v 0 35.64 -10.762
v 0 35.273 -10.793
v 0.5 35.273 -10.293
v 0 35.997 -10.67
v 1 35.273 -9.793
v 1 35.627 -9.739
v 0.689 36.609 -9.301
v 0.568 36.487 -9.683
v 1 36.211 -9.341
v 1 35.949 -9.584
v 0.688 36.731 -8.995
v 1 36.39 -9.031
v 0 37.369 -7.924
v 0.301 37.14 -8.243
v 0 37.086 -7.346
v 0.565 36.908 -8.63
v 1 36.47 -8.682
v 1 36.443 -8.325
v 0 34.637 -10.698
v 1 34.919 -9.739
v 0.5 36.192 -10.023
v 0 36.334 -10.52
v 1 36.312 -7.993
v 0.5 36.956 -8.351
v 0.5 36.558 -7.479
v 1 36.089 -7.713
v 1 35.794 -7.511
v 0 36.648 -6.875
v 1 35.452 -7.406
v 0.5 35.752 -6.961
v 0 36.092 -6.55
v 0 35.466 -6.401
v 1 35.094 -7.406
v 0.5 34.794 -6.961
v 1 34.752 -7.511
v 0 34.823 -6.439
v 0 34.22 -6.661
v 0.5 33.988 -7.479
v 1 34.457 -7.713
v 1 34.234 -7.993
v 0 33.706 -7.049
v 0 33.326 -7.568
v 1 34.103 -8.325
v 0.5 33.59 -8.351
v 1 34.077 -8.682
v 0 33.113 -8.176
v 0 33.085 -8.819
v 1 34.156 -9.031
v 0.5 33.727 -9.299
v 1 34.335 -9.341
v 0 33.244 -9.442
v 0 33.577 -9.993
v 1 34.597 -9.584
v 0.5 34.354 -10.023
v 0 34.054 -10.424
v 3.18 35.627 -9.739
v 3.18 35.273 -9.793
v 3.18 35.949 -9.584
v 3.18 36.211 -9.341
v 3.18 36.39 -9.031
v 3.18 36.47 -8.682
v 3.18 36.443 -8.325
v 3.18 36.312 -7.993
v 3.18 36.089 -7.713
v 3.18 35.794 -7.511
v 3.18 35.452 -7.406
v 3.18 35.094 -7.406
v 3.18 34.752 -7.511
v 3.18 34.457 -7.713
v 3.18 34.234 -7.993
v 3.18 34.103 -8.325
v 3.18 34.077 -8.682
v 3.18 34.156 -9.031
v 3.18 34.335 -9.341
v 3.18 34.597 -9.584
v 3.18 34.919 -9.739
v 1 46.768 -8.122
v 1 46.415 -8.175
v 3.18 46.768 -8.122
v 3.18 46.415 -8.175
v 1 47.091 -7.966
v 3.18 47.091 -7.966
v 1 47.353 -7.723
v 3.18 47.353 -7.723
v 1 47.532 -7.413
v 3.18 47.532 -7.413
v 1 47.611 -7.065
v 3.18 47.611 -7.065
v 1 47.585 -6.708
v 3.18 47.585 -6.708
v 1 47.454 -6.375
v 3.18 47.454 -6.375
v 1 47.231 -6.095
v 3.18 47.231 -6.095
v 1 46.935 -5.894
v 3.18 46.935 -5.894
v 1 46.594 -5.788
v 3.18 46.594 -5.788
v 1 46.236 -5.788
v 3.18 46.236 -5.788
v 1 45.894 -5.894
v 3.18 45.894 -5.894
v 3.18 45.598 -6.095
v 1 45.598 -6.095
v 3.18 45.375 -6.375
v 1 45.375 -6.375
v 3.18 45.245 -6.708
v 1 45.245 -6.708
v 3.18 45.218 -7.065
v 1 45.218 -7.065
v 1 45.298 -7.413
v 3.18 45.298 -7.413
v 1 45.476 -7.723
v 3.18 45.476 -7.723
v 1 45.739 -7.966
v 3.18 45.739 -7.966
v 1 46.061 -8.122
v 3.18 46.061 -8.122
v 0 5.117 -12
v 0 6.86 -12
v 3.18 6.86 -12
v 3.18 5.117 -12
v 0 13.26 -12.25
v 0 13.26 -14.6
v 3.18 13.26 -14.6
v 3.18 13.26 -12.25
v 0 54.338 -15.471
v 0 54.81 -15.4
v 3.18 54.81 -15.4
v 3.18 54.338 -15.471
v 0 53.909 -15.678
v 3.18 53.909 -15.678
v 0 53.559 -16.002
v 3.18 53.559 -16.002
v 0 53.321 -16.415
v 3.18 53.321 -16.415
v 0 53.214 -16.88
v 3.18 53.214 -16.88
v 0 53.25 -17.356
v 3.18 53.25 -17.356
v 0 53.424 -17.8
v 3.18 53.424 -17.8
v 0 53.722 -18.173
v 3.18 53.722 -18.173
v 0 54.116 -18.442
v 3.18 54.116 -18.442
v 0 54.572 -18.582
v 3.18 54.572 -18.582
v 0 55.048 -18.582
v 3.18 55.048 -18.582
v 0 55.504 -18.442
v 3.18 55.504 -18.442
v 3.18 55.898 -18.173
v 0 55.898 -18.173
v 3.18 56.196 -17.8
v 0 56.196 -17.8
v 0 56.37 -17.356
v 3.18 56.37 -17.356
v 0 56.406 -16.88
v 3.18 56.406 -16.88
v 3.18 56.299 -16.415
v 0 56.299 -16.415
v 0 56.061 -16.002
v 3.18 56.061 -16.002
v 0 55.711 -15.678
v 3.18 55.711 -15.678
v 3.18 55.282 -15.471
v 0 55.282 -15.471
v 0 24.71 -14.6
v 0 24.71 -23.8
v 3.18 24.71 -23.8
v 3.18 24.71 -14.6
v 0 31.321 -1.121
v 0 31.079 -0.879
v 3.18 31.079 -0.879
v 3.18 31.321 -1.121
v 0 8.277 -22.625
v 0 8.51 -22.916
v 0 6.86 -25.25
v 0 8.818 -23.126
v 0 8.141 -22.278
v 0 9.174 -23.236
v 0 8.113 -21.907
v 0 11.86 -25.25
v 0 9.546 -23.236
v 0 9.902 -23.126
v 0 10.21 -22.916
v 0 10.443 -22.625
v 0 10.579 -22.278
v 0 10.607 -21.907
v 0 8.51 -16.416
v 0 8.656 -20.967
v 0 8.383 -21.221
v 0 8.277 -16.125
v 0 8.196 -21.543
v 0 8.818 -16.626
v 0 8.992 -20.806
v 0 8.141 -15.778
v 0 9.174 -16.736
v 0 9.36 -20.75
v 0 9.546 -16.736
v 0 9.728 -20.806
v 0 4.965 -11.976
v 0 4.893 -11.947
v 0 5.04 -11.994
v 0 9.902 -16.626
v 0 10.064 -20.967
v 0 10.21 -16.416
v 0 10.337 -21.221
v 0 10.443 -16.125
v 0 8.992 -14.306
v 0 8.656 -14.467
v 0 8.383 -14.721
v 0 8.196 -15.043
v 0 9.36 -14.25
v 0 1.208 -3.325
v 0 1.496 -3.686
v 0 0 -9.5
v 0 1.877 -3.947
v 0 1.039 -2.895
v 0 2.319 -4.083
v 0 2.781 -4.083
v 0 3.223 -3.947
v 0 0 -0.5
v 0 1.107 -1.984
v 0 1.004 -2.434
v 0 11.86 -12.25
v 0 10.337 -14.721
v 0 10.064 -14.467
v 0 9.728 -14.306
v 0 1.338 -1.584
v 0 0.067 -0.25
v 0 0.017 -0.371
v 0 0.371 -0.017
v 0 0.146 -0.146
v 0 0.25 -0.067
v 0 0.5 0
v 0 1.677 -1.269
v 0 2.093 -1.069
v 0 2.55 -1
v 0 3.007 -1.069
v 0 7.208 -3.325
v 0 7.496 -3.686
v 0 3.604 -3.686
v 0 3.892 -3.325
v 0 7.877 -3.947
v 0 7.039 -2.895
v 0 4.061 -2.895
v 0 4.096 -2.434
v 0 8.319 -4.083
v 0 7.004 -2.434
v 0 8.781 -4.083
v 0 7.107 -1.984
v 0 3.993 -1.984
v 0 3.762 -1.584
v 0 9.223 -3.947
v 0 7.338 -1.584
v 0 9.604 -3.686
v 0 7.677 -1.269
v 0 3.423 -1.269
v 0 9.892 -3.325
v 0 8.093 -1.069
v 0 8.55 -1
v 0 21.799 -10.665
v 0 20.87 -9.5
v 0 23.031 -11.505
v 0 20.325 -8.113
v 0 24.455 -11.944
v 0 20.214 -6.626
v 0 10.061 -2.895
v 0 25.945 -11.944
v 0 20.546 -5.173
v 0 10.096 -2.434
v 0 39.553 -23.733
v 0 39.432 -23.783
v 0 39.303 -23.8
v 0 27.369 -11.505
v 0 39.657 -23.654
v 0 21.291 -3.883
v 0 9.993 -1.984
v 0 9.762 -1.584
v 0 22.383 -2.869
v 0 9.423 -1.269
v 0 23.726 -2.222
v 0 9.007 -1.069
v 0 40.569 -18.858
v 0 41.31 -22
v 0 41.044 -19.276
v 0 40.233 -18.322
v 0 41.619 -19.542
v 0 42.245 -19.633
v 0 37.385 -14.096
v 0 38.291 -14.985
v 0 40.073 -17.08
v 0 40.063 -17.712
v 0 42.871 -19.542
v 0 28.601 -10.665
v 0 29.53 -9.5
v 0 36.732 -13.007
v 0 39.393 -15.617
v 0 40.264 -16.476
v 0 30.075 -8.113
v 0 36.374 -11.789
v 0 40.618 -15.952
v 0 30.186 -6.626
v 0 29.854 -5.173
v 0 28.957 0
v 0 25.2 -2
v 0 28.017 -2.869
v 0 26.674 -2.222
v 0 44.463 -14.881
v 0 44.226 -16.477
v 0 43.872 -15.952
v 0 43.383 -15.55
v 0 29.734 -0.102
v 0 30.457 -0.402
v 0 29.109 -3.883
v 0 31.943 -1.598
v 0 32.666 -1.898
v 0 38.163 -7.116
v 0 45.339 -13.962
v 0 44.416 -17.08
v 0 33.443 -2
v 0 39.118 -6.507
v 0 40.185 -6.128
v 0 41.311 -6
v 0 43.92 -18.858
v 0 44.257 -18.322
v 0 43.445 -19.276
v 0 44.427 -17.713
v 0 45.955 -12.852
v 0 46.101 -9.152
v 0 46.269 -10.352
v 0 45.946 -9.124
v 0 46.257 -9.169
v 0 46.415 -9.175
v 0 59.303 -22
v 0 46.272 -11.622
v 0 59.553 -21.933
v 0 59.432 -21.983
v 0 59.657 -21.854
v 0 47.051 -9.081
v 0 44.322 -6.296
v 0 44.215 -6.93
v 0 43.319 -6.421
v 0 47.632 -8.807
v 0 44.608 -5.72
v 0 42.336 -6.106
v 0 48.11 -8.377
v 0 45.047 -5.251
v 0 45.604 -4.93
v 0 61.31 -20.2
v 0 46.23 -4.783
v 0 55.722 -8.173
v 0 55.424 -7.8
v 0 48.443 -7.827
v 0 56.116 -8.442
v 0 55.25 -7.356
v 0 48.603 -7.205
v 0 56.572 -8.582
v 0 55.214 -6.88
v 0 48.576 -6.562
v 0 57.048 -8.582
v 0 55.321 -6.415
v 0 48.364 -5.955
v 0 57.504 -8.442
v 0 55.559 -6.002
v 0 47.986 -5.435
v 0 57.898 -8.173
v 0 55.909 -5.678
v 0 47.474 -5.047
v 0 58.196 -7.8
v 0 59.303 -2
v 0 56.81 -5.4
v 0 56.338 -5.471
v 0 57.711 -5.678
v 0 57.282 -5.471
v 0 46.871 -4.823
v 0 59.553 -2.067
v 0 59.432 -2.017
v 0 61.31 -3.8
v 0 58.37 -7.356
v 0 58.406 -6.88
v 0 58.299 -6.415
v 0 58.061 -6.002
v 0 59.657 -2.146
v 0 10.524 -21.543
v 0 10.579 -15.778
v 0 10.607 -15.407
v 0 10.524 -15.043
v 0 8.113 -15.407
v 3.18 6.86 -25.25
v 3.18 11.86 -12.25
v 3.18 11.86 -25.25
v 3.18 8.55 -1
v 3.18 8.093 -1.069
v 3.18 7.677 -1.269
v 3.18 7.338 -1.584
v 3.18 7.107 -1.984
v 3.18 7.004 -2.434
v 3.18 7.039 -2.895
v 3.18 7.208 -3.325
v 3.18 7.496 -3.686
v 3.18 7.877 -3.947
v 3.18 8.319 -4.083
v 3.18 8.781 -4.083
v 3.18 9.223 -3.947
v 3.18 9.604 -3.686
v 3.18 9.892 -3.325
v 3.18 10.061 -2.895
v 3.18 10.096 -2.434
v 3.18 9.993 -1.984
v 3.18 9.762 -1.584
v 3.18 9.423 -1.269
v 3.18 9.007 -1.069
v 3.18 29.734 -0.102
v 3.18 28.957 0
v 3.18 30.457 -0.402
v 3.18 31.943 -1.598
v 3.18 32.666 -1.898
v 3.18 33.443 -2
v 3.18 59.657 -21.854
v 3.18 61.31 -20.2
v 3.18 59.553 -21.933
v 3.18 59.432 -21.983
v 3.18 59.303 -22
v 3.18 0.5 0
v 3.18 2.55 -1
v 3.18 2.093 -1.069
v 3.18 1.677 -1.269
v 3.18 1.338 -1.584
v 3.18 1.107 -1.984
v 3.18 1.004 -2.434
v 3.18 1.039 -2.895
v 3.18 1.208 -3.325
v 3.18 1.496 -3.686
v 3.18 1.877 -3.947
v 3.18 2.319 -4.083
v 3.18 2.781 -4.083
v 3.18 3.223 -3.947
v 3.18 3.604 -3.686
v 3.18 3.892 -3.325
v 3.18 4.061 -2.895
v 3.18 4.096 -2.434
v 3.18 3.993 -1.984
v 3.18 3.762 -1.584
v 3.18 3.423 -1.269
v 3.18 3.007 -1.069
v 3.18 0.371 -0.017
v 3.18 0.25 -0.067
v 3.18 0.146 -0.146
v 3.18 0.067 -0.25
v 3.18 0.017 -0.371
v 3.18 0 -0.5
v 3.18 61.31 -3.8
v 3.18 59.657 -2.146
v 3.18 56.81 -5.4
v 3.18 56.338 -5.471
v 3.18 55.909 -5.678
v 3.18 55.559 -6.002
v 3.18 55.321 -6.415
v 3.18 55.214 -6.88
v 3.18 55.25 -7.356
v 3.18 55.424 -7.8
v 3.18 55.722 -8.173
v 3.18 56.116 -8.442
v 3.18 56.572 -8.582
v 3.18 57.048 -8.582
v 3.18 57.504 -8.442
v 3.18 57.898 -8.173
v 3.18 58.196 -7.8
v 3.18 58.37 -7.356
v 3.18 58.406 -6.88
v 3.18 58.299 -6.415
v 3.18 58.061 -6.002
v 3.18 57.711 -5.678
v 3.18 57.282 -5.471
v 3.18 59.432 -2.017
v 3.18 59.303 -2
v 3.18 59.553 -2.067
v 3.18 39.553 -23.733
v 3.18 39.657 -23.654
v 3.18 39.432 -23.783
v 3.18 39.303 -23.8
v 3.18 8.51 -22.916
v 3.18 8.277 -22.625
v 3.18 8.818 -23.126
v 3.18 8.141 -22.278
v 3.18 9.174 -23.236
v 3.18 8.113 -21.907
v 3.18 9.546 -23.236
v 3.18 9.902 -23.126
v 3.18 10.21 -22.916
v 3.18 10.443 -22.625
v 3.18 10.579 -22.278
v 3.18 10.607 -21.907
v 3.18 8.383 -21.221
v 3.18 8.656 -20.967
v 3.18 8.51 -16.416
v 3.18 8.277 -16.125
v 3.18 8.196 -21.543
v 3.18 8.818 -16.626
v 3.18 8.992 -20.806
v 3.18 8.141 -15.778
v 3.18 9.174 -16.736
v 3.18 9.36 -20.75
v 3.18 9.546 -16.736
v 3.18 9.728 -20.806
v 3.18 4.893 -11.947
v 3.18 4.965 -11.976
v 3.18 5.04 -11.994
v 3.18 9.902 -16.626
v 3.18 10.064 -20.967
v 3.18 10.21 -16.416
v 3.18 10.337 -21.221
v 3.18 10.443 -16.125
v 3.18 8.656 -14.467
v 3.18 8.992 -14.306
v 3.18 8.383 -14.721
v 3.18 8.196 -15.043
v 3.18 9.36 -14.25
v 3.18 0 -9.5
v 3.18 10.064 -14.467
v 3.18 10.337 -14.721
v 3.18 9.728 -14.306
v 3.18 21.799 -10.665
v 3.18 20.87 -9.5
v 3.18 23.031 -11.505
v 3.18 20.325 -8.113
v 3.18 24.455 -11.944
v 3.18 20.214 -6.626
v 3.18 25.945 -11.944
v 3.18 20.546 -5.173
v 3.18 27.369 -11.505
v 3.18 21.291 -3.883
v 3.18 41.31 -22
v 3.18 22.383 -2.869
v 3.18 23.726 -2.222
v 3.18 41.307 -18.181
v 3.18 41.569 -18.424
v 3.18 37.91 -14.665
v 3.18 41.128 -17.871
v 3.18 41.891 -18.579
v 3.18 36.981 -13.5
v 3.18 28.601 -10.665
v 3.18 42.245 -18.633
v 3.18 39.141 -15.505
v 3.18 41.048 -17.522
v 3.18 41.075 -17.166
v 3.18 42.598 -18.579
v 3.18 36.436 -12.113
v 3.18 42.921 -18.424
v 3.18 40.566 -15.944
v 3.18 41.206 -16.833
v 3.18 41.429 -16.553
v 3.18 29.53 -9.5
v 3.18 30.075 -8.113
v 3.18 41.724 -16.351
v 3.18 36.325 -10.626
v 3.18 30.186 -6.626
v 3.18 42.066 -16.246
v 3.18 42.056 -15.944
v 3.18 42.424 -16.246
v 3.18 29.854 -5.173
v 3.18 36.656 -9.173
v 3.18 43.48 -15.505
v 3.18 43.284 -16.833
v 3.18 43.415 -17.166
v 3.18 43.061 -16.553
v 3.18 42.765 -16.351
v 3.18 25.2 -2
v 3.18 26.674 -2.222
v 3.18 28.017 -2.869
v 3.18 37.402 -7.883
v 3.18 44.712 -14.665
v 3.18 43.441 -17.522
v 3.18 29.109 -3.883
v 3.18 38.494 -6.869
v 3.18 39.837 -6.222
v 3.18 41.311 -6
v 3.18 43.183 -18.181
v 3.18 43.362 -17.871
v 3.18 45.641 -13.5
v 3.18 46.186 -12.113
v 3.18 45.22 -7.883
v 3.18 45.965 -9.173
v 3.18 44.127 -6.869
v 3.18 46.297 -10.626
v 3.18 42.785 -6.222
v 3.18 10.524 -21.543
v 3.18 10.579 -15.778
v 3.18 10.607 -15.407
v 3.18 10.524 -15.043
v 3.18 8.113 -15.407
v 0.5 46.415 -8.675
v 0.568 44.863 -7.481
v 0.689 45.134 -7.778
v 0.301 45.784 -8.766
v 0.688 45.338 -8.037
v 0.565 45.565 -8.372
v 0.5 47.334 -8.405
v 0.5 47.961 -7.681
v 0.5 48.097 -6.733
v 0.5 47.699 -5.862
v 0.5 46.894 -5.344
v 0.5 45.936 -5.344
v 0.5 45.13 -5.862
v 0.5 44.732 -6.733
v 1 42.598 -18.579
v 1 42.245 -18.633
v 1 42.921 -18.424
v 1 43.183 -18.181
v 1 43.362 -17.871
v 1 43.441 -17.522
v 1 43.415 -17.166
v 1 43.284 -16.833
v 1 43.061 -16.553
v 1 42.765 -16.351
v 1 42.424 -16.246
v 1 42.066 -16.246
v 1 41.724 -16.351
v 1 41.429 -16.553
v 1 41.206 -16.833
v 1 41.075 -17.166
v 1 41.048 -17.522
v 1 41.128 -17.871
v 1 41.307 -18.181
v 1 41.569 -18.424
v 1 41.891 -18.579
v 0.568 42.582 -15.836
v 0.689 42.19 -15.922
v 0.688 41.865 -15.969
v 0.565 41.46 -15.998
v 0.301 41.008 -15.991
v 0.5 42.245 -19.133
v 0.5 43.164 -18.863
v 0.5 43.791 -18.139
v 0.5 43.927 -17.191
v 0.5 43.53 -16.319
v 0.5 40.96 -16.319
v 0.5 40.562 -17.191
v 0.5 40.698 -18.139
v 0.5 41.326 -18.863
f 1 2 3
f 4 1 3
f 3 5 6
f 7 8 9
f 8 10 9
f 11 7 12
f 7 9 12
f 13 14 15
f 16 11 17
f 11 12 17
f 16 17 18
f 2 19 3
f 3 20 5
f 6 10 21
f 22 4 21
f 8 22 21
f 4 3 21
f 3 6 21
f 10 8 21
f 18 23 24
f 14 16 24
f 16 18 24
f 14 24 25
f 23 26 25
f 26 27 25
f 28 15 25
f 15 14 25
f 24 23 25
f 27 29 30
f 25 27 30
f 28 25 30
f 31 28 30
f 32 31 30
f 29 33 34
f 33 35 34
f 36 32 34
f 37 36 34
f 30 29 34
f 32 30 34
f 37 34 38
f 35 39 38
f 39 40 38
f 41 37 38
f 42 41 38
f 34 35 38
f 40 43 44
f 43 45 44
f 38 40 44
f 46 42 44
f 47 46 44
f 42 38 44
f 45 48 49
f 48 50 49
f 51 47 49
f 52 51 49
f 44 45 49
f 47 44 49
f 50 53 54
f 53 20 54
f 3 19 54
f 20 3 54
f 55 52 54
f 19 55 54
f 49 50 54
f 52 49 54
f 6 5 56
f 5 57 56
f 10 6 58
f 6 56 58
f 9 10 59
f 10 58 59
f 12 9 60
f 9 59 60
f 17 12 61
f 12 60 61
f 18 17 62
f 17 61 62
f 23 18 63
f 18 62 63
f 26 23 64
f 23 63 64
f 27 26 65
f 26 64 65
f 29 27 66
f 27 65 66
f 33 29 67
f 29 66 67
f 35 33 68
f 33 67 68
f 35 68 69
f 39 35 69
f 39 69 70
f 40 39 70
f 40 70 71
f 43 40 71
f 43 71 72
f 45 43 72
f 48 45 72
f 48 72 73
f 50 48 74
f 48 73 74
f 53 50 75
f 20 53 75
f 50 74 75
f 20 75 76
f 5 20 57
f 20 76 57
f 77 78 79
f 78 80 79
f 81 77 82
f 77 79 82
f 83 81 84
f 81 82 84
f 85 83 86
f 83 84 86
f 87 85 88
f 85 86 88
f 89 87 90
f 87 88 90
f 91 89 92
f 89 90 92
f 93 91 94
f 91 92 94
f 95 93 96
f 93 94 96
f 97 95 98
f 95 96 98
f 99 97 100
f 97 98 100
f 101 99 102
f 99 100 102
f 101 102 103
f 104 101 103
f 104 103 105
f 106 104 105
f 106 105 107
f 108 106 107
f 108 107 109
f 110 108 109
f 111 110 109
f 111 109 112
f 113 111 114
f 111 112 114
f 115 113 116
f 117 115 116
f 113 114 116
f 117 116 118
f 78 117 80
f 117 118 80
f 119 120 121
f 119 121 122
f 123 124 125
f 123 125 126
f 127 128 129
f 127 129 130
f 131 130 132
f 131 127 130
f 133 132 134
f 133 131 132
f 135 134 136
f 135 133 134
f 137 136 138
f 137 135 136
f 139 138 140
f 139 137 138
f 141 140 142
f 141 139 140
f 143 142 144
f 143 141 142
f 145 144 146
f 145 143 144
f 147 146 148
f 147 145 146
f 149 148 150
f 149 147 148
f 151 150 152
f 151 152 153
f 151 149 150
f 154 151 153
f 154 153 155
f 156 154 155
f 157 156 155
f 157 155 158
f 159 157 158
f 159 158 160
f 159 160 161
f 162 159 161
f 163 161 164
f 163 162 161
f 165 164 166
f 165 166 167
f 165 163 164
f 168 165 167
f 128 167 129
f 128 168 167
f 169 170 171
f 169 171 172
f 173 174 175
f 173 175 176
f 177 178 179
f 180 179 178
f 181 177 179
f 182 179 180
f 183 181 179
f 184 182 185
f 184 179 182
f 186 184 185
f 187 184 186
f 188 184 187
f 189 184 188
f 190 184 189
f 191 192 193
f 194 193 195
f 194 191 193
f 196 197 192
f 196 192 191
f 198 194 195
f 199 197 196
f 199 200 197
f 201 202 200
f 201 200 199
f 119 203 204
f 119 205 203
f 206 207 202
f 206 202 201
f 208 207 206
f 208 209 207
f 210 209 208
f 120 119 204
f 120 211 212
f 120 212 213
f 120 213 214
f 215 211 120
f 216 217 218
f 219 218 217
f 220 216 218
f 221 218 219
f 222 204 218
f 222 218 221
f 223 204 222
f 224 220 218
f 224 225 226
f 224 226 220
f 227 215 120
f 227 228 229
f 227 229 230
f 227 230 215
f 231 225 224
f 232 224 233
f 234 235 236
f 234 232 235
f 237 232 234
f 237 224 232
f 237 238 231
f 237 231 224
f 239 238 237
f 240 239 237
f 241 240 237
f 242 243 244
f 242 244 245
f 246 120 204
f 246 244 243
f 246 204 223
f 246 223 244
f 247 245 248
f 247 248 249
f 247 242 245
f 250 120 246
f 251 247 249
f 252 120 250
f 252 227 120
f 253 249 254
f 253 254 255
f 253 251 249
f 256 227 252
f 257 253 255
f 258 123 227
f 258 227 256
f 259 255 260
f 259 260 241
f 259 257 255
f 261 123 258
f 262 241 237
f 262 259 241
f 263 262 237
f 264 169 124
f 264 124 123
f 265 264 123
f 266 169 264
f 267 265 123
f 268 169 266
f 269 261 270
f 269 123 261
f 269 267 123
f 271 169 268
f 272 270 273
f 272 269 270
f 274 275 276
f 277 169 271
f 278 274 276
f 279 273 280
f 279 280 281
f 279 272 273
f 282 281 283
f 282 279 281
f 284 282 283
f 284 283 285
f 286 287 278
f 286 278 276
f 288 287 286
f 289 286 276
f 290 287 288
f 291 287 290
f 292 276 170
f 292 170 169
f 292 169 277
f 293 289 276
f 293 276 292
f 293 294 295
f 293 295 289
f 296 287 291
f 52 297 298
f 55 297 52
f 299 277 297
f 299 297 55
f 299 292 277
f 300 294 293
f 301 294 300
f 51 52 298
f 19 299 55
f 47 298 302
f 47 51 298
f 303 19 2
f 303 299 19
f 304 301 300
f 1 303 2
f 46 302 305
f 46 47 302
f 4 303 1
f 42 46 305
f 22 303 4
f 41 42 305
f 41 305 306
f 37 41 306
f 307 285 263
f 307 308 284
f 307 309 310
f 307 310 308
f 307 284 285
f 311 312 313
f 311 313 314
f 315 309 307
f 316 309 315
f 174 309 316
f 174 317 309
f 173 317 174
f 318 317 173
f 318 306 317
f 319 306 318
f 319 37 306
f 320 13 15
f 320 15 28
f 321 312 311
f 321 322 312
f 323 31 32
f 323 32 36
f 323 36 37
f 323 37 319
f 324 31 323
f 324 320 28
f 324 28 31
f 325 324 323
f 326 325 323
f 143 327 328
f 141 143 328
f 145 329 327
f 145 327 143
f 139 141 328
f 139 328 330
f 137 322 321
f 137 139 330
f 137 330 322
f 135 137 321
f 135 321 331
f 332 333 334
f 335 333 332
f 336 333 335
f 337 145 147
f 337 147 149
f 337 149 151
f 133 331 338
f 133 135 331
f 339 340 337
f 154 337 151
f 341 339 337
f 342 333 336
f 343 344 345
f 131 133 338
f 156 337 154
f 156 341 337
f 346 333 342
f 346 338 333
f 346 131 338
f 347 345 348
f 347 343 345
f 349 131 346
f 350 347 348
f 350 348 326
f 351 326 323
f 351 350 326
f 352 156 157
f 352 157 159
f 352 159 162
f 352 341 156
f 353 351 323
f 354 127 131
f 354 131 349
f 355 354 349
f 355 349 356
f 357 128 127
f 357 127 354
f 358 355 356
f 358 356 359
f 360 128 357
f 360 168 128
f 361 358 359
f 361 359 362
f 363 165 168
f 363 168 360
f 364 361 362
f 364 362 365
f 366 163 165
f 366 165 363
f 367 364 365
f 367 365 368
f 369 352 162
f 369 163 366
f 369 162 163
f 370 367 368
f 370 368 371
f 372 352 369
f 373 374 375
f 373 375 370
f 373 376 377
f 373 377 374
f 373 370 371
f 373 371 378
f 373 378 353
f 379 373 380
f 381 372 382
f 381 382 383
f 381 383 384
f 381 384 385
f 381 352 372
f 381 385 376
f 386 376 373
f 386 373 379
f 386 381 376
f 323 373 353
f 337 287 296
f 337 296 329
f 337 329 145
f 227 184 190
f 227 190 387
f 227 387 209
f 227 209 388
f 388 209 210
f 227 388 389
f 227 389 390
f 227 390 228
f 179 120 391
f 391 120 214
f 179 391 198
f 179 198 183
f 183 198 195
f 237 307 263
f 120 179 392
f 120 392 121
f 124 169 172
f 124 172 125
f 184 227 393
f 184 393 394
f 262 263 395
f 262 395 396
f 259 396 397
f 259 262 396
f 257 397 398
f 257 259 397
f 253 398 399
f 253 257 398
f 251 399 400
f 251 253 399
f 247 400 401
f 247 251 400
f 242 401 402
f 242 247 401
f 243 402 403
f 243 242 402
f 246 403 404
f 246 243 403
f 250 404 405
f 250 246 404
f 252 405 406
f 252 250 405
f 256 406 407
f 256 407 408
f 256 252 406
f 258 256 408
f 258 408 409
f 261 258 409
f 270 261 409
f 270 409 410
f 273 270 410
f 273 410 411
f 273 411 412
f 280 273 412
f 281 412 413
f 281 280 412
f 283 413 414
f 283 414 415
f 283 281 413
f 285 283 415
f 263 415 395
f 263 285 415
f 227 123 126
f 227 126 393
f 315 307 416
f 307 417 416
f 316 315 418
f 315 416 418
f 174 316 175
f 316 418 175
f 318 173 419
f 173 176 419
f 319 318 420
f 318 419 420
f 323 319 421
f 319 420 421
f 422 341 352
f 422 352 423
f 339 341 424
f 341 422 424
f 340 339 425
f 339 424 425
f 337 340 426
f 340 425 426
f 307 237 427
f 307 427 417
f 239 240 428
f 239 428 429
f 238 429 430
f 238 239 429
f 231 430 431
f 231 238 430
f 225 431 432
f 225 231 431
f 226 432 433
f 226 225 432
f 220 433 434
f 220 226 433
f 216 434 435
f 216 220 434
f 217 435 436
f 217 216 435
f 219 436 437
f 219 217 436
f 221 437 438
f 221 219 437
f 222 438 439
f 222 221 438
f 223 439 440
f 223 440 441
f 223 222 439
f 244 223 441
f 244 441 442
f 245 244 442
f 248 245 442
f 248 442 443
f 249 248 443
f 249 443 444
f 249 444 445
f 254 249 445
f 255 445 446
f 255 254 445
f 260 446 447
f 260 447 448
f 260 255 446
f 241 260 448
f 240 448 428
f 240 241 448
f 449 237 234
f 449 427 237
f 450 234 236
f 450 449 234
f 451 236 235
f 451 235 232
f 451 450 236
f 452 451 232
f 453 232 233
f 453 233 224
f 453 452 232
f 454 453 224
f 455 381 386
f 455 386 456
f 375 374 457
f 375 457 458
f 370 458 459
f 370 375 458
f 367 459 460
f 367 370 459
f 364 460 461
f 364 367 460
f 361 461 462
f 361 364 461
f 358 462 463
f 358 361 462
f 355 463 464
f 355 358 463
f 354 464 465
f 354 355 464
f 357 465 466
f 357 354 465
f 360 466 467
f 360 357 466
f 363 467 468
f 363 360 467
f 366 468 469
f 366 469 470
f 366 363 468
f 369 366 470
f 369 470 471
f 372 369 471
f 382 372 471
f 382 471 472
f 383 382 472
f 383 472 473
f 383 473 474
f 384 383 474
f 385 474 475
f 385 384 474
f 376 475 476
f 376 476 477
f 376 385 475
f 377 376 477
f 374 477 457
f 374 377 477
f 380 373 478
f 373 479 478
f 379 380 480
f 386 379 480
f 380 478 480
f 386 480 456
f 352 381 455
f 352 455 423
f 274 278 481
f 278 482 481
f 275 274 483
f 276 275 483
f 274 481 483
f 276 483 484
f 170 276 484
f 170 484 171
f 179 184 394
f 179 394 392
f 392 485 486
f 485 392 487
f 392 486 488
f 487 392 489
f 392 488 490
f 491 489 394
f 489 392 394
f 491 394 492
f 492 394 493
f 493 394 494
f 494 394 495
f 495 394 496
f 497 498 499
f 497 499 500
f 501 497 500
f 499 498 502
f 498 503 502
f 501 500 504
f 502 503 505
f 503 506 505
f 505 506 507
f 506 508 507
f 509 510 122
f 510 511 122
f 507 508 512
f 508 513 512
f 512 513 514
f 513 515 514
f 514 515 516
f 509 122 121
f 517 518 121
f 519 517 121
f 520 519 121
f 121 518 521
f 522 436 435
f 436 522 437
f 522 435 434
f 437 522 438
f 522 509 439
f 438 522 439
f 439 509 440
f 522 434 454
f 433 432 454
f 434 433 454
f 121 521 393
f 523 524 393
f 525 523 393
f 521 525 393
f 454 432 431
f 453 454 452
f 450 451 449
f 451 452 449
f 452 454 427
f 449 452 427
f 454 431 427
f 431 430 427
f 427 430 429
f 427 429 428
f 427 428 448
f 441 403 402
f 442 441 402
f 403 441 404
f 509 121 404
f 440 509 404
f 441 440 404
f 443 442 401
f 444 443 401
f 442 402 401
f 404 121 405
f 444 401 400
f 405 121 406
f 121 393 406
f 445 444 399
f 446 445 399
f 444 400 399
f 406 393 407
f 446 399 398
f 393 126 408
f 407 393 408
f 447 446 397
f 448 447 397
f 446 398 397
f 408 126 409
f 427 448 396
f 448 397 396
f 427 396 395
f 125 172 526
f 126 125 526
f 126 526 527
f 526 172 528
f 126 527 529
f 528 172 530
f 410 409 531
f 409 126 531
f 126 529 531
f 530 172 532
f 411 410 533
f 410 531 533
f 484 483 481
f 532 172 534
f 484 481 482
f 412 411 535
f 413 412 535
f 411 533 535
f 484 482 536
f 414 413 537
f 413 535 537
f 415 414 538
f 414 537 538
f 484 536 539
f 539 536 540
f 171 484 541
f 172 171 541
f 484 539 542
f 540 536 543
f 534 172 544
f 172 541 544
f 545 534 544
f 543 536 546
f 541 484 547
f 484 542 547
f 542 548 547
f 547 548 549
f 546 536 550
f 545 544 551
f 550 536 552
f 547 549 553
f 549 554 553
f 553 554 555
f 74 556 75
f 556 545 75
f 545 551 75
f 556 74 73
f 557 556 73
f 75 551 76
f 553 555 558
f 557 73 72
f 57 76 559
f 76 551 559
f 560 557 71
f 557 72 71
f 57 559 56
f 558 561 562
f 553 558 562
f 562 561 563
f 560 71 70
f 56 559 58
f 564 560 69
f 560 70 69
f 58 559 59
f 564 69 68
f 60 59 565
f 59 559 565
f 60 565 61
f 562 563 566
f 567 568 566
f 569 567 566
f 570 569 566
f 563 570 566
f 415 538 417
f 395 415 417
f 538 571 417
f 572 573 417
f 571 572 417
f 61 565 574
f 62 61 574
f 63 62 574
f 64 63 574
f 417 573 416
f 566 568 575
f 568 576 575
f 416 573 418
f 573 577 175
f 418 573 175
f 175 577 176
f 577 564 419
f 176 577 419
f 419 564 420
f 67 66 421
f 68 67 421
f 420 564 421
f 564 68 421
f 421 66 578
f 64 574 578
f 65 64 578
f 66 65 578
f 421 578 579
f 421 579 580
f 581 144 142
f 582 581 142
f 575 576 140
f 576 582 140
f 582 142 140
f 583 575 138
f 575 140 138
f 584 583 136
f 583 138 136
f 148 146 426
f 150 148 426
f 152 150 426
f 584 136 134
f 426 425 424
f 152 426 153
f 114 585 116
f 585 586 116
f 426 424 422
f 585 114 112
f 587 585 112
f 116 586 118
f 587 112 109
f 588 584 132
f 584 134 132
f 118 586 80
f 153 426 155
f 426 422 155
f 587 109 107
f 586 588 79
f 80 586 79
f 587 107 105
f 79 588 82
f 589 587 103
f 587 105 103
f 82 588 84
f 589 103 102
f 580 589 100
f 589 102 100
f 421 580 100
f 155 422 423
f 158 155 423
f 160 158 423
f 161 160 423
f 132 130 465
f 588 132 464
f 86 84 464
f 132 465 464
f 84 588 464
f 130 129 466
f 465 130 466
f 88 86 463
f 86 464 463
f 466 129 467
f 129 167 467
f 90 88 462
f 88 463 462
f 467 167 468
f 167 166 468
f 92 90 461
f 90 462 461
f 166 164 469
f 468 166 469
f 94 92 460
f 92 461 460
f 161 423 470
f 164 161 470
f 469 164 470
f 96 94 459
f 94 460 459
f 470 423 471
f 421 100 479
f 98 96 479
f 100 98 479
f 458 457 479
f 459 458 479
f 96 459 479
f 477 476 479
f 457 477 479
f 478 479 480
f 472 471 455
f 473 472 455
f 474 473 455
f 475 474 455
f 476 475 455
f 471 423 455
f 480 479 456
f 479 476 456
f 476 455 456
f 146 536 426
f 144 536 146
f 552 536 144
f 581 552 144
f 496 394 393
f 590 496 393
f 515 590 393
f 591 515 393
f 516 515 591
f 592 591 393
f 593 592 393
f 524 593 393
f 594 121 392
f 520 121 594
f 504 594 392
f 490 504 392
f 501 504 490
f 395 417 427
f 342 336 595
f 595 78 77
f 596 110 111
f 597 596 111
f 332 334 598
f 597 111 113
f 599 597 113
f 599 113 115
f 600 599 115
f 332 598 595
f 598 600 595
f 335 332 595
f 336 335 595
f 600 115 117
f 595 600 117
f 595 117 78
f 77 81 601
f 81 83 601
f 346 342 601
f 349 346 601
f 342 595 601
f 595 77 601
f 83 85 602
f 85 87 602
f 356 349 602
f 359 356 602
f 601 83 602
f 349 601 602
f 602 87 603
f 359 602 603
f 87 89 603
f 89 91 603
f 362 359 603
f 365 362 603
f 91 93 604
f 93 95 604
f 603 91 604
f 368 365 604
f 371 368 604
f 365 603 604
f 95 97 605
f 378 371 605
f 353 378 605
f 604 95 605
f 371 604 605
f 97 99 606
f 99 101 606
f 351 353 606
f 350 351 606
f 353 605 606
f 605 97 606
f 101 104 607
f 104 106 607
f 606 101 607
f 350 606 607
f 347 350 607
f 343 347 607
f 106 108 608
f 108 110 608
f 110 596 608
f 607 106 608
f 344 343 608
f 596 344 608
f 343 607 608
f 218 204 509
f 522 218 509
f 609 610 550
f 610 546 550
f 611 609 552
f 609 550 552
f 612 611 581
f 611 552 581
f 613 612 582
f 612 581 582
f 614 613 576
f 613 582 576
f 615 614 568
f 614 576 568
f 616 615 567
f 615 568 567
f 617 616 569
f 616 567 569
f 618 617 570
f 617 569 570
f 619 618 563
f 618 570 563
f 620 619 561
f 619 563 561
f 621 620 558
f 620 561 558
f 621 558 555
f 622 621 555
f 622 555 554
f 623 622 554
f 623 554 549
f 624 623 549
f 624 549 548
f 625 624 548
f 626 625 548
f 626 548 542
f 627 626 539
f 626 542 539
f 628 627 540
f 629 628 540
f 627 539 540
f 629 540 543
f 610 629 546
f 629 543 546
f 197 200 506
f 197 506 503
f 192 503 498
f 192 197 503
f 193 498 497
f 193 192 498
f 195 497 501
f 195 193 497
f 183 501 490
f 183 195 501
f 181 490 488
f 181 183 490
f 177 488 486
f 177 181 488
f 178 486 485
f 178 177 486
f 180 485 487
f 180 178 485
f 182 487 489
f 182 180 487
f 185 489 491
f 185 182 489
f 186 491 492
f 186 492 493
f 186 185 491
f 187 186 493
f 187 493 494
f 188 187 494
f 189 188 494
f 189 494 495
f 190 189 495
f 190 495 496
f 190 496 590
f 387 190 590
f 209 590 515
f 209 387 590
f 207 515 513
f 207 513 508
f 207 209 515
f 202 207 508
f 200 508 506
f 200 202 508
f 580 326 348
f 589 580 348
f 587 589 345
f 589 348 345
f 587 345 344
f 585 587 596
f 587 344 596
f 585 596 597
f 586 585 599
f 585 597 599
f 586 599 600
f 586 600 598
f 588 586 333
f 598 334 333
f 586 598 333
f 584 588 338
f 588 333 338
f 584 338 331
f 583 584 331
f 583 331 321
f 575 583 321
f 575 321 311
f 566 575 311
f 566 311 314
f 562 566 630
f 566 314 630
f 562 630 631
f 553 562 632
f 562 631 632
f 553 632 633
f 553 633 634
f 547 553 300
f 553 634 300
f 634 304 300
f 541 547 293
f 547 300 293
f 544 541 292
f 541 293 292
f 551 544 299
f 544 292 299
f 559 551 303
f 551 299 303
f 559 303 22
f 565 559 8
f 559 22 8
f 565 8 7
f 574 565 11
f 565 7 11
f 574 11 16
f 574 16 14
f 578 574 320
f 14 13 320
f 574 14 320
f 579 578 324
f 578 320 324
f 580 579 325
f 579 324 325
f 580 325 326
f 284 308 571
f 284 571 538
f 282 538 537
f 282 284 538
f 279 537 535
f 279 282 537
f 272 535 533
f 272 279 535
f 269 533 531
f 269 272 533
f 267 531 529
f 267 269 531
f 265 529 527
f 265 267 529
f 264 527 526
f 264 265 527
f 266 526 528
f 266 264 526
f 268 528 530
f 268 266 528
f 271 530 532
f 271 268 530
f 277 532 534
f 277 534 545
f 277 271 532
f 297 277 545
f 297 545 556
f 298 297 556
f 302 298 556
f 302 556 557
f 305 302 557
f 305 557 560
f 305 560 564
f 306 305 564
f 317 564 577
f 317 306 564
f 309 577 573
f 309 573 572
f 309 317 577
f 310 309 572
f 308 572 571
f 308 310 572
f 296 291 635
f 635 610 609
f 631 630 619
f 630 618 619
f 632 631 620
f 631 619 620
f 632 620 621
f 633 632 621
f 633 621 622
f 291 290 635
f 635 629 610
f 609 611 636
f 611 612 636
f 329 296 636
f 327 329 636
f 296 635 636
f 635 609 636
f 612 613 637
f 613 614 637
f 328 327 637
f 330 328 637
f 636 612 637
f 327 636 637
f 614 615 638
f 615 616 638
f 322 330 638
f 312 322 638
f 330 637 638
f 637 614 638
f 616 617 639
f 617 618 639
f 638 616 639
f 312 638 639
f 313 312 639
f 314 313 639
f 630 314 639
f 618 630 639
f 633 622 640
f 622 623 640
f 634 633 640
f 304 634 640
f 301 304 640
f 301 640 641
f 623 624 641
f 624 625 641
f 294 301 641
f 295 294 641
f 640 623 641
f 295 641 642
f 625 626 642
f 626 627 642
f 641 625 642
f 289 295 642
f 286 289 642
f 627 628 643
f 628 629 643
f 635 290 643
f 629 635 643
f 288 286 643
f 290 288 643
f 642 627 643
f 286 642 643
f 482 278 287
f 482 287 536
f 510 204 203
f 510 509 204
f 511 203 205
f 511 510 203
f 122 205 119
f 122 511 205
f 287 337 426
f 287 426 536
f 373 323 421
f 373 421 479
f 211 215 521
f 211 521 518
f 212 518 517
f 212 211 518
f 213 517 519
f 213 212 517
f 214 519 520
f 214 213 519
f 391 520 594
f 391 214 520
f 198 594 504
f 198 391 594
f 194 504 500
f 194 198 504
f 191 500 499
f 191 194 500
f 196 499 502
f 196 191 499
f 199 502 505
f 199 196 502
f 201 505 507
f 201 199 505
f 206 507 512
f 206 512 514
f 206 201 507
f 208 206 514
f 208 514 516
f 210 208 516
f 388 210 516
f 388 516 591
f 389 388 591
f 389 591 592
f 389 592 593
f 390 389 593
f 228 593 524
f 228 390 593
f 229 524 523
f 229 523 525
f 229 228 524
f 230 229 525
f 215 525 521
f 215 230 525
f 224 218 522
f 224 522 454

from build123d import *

# Parameters (mm, degrees)
SKETCH1_R                                       = 5
SKETCH1_R_2                                     = 1.6
SKETCH1_R_3                                     = 1.25
SKETCH1_R_4                                     = 1.55
BOSS_EXTRUDE1_DEPTH                             = 3.18
CHAMFER1_SIZE                                   = 2.5
CHAMFER1_SIZE2                                  = 4.998920521
CSK_FOR_M2_FLAT_HEAD_MACHINE_SCREW1_D           = 2.4
CSK_FOR_M2_FLAT_HEAD_MACHINE_SCREW1_DEPTH       = 3.508967257
CSK_FOR_M2_FLAT_HEAD_MACHINE_SCREW1_CSINK_D     = 4.4
CSK_FOR_M2_FLAT_HEAD_MACHINE_SCREW1_CSINK_ANGLE = 90
CSK_FOR_M2_FLAT_HEAD_MACHINE_SCREW1_TIP         = 0.721032743
SKETCH3_R                                       = 5
CUT_EXTRUDE4_DEPTH                              = 67.382158748
FILLET2_R                                       = 3
CHAMFER2_SIZE                                   = 1.8
FILLET4_R                                       = 0.5


with BuildPart() as part:
    # Sketch1 → Boss-Extrude1 (new body)
    with BuildSketch(Plane(origin=(0, 0, 0), x_dir=(0, 0, -1), z_dir=(1, 0, 0))):
        Polygon((0, 0), (0, 30.2), (2, 32.2), (2, 61.31), (22, 61.31), (22, 41.31), (23.8, 41.31), (23.8, 24.71), (14.6, 24.71), (14.6, 13.26), (12.25, 13.26), (12.25, 11.86), (25.25, 11.86), (25.25, 6.86), (12, 6.86), (12, 0), align=None)
        with Locations(Location((7, 25.2, 0), (0, 0, 180))):
            Circle(SKETCH1_R, mode=Mode.SUBTRACT)
        with Locations(Location((7, 56.81, 0), (0, 0, 180))):
            Circle(SKETCH1_R_2, mode=Mode.SUBTRACT)
        with Locations(Location((17, 54.81, 0), (0, 0, 180))):
            Circle(SKETCH1_R_2, mode=Mode.SUBTRACT)
        with Locations(Location((22, 9.36, 0), (0, 0, 180))):
            Circle(SKETCH1_R_3, mode=Mode.SUBTRACT)
        with Locations(Location((15.5, 9.36, 0), (0, 0, 180))):
            Circle(SKETCH1_R_3, mode=Mode.SUBTRACT)
        with Locations(Location((2.55, 2.55, 0), (0, 0, 180))):
            Circle(SKETCH1_R_4, mode=Mode.SUBTRACT)
        with Locations(Location((2.55, 8.55, 0), (0, 0, 180))):
            Circle(SKETCH1_R_4, mode=Mode.SUBTRACT)
    extrude(amount=BOSS_EXTRUDE1_DEPTH)

    # Chamfer1
    chamfer1_edges = [part.edges().sort_by_distance(p)[0] for p in [
        (1.59, 0, -12),
    ]]
    chamfer1_side = [part.faces().sort_by_distance(p)[0] for p in [
        (1.59, 0, -6),
    ]]
    chamfer(chamfer1_edges, length=CHAMFER1_SIZE, length2=CHAMFER1_SIZE2, reference=chamfer1_side[0])

    # CSK for M2 Flat Head Machine Screw1
    with Locations(Plane.ZY):
        with Locations((-6.974936087, 46.414674329), (-17.432559713, 42.244769284), (-8.592504199, 35.273154083)):
            CounterSinkHole(CSK_FOR_M2_FLAT_HEAD_MACHINE_SCREW1_D / 2, CSK_FOR_M2_FLAT_HEAD_MACHINE_SCREW1_CSINK_D / 2, depth=CSK_FOR_M2_FLAT_HEAD_MACHINE_SCREW1_DEPTH, counter_sink_angle=CSK_FOR_M2_FLAT_HEAD_MACHINE_SCREW1_CSINK_ANGLE)
            with Locations((0, 0, -(CSK_FOR_M2_FLAT_HEAD_MACHINE_SCREW1_DEPTH + CSK_FOR_M2_FLAT_HEAD_MACHINE_SCREW1_TIP / 2))):  # 118° drill point
                Cone(0, CSK_FOR_M2_FLAT_HEAD_MACHINE_SCREW1_D / 2, CSK_FOR_M2_FLAT_HEAD_MACHINE_SCREW1_TIP, mode=Mode.SUBTRACT)

    # Sketch3 → Cut-Extrude4 (cut, through all)
    with BuildSketch(Plane.ZY):
        with Locations((-11, 41.310865899)):
            Circle(SKETCH3_R)
    extrude(amount=-CUT_EXTRUDE4_DEPTH, mode=Mode.SUBTRACT)

    # Fillet2
    fillet2_edges = [part.edges().sort_by_distance(p)[0] for p in [
        (1.59, 30.2, 0),
        (1.59, 32.2, -2),
    ]]
    fillet(fillet2_edges, radius=FILLET2_R)

    # Chamfer2
    chamfer2_edges = [part.edges().sort_by_distance(p)[0] for p in [
        (1.59, 61.31, -22),
        (1.59, 61.31, -2),
        (1.59, 41.31, -23.8),
    ]]
    chamfer(chamfer2_edges, length=CHAMFER2_SIZE - 0.0001)  # a hair under: the kernel refuses the full size

    # Fillet4
    fillet4_edges = [part.edges().sort_by_distance(p)[0] for p in [
        (1.59, 39.5101, -23.8),
        (1.59, 59.5101, -22),
        (1.59, 59.5101, -2),
        (1.59, 0, 0),
        (1.59, 4.998920521, -12),
    ]]
    fillet(fillet4_edges, radius=FILLET4_R)


solid = part.part
